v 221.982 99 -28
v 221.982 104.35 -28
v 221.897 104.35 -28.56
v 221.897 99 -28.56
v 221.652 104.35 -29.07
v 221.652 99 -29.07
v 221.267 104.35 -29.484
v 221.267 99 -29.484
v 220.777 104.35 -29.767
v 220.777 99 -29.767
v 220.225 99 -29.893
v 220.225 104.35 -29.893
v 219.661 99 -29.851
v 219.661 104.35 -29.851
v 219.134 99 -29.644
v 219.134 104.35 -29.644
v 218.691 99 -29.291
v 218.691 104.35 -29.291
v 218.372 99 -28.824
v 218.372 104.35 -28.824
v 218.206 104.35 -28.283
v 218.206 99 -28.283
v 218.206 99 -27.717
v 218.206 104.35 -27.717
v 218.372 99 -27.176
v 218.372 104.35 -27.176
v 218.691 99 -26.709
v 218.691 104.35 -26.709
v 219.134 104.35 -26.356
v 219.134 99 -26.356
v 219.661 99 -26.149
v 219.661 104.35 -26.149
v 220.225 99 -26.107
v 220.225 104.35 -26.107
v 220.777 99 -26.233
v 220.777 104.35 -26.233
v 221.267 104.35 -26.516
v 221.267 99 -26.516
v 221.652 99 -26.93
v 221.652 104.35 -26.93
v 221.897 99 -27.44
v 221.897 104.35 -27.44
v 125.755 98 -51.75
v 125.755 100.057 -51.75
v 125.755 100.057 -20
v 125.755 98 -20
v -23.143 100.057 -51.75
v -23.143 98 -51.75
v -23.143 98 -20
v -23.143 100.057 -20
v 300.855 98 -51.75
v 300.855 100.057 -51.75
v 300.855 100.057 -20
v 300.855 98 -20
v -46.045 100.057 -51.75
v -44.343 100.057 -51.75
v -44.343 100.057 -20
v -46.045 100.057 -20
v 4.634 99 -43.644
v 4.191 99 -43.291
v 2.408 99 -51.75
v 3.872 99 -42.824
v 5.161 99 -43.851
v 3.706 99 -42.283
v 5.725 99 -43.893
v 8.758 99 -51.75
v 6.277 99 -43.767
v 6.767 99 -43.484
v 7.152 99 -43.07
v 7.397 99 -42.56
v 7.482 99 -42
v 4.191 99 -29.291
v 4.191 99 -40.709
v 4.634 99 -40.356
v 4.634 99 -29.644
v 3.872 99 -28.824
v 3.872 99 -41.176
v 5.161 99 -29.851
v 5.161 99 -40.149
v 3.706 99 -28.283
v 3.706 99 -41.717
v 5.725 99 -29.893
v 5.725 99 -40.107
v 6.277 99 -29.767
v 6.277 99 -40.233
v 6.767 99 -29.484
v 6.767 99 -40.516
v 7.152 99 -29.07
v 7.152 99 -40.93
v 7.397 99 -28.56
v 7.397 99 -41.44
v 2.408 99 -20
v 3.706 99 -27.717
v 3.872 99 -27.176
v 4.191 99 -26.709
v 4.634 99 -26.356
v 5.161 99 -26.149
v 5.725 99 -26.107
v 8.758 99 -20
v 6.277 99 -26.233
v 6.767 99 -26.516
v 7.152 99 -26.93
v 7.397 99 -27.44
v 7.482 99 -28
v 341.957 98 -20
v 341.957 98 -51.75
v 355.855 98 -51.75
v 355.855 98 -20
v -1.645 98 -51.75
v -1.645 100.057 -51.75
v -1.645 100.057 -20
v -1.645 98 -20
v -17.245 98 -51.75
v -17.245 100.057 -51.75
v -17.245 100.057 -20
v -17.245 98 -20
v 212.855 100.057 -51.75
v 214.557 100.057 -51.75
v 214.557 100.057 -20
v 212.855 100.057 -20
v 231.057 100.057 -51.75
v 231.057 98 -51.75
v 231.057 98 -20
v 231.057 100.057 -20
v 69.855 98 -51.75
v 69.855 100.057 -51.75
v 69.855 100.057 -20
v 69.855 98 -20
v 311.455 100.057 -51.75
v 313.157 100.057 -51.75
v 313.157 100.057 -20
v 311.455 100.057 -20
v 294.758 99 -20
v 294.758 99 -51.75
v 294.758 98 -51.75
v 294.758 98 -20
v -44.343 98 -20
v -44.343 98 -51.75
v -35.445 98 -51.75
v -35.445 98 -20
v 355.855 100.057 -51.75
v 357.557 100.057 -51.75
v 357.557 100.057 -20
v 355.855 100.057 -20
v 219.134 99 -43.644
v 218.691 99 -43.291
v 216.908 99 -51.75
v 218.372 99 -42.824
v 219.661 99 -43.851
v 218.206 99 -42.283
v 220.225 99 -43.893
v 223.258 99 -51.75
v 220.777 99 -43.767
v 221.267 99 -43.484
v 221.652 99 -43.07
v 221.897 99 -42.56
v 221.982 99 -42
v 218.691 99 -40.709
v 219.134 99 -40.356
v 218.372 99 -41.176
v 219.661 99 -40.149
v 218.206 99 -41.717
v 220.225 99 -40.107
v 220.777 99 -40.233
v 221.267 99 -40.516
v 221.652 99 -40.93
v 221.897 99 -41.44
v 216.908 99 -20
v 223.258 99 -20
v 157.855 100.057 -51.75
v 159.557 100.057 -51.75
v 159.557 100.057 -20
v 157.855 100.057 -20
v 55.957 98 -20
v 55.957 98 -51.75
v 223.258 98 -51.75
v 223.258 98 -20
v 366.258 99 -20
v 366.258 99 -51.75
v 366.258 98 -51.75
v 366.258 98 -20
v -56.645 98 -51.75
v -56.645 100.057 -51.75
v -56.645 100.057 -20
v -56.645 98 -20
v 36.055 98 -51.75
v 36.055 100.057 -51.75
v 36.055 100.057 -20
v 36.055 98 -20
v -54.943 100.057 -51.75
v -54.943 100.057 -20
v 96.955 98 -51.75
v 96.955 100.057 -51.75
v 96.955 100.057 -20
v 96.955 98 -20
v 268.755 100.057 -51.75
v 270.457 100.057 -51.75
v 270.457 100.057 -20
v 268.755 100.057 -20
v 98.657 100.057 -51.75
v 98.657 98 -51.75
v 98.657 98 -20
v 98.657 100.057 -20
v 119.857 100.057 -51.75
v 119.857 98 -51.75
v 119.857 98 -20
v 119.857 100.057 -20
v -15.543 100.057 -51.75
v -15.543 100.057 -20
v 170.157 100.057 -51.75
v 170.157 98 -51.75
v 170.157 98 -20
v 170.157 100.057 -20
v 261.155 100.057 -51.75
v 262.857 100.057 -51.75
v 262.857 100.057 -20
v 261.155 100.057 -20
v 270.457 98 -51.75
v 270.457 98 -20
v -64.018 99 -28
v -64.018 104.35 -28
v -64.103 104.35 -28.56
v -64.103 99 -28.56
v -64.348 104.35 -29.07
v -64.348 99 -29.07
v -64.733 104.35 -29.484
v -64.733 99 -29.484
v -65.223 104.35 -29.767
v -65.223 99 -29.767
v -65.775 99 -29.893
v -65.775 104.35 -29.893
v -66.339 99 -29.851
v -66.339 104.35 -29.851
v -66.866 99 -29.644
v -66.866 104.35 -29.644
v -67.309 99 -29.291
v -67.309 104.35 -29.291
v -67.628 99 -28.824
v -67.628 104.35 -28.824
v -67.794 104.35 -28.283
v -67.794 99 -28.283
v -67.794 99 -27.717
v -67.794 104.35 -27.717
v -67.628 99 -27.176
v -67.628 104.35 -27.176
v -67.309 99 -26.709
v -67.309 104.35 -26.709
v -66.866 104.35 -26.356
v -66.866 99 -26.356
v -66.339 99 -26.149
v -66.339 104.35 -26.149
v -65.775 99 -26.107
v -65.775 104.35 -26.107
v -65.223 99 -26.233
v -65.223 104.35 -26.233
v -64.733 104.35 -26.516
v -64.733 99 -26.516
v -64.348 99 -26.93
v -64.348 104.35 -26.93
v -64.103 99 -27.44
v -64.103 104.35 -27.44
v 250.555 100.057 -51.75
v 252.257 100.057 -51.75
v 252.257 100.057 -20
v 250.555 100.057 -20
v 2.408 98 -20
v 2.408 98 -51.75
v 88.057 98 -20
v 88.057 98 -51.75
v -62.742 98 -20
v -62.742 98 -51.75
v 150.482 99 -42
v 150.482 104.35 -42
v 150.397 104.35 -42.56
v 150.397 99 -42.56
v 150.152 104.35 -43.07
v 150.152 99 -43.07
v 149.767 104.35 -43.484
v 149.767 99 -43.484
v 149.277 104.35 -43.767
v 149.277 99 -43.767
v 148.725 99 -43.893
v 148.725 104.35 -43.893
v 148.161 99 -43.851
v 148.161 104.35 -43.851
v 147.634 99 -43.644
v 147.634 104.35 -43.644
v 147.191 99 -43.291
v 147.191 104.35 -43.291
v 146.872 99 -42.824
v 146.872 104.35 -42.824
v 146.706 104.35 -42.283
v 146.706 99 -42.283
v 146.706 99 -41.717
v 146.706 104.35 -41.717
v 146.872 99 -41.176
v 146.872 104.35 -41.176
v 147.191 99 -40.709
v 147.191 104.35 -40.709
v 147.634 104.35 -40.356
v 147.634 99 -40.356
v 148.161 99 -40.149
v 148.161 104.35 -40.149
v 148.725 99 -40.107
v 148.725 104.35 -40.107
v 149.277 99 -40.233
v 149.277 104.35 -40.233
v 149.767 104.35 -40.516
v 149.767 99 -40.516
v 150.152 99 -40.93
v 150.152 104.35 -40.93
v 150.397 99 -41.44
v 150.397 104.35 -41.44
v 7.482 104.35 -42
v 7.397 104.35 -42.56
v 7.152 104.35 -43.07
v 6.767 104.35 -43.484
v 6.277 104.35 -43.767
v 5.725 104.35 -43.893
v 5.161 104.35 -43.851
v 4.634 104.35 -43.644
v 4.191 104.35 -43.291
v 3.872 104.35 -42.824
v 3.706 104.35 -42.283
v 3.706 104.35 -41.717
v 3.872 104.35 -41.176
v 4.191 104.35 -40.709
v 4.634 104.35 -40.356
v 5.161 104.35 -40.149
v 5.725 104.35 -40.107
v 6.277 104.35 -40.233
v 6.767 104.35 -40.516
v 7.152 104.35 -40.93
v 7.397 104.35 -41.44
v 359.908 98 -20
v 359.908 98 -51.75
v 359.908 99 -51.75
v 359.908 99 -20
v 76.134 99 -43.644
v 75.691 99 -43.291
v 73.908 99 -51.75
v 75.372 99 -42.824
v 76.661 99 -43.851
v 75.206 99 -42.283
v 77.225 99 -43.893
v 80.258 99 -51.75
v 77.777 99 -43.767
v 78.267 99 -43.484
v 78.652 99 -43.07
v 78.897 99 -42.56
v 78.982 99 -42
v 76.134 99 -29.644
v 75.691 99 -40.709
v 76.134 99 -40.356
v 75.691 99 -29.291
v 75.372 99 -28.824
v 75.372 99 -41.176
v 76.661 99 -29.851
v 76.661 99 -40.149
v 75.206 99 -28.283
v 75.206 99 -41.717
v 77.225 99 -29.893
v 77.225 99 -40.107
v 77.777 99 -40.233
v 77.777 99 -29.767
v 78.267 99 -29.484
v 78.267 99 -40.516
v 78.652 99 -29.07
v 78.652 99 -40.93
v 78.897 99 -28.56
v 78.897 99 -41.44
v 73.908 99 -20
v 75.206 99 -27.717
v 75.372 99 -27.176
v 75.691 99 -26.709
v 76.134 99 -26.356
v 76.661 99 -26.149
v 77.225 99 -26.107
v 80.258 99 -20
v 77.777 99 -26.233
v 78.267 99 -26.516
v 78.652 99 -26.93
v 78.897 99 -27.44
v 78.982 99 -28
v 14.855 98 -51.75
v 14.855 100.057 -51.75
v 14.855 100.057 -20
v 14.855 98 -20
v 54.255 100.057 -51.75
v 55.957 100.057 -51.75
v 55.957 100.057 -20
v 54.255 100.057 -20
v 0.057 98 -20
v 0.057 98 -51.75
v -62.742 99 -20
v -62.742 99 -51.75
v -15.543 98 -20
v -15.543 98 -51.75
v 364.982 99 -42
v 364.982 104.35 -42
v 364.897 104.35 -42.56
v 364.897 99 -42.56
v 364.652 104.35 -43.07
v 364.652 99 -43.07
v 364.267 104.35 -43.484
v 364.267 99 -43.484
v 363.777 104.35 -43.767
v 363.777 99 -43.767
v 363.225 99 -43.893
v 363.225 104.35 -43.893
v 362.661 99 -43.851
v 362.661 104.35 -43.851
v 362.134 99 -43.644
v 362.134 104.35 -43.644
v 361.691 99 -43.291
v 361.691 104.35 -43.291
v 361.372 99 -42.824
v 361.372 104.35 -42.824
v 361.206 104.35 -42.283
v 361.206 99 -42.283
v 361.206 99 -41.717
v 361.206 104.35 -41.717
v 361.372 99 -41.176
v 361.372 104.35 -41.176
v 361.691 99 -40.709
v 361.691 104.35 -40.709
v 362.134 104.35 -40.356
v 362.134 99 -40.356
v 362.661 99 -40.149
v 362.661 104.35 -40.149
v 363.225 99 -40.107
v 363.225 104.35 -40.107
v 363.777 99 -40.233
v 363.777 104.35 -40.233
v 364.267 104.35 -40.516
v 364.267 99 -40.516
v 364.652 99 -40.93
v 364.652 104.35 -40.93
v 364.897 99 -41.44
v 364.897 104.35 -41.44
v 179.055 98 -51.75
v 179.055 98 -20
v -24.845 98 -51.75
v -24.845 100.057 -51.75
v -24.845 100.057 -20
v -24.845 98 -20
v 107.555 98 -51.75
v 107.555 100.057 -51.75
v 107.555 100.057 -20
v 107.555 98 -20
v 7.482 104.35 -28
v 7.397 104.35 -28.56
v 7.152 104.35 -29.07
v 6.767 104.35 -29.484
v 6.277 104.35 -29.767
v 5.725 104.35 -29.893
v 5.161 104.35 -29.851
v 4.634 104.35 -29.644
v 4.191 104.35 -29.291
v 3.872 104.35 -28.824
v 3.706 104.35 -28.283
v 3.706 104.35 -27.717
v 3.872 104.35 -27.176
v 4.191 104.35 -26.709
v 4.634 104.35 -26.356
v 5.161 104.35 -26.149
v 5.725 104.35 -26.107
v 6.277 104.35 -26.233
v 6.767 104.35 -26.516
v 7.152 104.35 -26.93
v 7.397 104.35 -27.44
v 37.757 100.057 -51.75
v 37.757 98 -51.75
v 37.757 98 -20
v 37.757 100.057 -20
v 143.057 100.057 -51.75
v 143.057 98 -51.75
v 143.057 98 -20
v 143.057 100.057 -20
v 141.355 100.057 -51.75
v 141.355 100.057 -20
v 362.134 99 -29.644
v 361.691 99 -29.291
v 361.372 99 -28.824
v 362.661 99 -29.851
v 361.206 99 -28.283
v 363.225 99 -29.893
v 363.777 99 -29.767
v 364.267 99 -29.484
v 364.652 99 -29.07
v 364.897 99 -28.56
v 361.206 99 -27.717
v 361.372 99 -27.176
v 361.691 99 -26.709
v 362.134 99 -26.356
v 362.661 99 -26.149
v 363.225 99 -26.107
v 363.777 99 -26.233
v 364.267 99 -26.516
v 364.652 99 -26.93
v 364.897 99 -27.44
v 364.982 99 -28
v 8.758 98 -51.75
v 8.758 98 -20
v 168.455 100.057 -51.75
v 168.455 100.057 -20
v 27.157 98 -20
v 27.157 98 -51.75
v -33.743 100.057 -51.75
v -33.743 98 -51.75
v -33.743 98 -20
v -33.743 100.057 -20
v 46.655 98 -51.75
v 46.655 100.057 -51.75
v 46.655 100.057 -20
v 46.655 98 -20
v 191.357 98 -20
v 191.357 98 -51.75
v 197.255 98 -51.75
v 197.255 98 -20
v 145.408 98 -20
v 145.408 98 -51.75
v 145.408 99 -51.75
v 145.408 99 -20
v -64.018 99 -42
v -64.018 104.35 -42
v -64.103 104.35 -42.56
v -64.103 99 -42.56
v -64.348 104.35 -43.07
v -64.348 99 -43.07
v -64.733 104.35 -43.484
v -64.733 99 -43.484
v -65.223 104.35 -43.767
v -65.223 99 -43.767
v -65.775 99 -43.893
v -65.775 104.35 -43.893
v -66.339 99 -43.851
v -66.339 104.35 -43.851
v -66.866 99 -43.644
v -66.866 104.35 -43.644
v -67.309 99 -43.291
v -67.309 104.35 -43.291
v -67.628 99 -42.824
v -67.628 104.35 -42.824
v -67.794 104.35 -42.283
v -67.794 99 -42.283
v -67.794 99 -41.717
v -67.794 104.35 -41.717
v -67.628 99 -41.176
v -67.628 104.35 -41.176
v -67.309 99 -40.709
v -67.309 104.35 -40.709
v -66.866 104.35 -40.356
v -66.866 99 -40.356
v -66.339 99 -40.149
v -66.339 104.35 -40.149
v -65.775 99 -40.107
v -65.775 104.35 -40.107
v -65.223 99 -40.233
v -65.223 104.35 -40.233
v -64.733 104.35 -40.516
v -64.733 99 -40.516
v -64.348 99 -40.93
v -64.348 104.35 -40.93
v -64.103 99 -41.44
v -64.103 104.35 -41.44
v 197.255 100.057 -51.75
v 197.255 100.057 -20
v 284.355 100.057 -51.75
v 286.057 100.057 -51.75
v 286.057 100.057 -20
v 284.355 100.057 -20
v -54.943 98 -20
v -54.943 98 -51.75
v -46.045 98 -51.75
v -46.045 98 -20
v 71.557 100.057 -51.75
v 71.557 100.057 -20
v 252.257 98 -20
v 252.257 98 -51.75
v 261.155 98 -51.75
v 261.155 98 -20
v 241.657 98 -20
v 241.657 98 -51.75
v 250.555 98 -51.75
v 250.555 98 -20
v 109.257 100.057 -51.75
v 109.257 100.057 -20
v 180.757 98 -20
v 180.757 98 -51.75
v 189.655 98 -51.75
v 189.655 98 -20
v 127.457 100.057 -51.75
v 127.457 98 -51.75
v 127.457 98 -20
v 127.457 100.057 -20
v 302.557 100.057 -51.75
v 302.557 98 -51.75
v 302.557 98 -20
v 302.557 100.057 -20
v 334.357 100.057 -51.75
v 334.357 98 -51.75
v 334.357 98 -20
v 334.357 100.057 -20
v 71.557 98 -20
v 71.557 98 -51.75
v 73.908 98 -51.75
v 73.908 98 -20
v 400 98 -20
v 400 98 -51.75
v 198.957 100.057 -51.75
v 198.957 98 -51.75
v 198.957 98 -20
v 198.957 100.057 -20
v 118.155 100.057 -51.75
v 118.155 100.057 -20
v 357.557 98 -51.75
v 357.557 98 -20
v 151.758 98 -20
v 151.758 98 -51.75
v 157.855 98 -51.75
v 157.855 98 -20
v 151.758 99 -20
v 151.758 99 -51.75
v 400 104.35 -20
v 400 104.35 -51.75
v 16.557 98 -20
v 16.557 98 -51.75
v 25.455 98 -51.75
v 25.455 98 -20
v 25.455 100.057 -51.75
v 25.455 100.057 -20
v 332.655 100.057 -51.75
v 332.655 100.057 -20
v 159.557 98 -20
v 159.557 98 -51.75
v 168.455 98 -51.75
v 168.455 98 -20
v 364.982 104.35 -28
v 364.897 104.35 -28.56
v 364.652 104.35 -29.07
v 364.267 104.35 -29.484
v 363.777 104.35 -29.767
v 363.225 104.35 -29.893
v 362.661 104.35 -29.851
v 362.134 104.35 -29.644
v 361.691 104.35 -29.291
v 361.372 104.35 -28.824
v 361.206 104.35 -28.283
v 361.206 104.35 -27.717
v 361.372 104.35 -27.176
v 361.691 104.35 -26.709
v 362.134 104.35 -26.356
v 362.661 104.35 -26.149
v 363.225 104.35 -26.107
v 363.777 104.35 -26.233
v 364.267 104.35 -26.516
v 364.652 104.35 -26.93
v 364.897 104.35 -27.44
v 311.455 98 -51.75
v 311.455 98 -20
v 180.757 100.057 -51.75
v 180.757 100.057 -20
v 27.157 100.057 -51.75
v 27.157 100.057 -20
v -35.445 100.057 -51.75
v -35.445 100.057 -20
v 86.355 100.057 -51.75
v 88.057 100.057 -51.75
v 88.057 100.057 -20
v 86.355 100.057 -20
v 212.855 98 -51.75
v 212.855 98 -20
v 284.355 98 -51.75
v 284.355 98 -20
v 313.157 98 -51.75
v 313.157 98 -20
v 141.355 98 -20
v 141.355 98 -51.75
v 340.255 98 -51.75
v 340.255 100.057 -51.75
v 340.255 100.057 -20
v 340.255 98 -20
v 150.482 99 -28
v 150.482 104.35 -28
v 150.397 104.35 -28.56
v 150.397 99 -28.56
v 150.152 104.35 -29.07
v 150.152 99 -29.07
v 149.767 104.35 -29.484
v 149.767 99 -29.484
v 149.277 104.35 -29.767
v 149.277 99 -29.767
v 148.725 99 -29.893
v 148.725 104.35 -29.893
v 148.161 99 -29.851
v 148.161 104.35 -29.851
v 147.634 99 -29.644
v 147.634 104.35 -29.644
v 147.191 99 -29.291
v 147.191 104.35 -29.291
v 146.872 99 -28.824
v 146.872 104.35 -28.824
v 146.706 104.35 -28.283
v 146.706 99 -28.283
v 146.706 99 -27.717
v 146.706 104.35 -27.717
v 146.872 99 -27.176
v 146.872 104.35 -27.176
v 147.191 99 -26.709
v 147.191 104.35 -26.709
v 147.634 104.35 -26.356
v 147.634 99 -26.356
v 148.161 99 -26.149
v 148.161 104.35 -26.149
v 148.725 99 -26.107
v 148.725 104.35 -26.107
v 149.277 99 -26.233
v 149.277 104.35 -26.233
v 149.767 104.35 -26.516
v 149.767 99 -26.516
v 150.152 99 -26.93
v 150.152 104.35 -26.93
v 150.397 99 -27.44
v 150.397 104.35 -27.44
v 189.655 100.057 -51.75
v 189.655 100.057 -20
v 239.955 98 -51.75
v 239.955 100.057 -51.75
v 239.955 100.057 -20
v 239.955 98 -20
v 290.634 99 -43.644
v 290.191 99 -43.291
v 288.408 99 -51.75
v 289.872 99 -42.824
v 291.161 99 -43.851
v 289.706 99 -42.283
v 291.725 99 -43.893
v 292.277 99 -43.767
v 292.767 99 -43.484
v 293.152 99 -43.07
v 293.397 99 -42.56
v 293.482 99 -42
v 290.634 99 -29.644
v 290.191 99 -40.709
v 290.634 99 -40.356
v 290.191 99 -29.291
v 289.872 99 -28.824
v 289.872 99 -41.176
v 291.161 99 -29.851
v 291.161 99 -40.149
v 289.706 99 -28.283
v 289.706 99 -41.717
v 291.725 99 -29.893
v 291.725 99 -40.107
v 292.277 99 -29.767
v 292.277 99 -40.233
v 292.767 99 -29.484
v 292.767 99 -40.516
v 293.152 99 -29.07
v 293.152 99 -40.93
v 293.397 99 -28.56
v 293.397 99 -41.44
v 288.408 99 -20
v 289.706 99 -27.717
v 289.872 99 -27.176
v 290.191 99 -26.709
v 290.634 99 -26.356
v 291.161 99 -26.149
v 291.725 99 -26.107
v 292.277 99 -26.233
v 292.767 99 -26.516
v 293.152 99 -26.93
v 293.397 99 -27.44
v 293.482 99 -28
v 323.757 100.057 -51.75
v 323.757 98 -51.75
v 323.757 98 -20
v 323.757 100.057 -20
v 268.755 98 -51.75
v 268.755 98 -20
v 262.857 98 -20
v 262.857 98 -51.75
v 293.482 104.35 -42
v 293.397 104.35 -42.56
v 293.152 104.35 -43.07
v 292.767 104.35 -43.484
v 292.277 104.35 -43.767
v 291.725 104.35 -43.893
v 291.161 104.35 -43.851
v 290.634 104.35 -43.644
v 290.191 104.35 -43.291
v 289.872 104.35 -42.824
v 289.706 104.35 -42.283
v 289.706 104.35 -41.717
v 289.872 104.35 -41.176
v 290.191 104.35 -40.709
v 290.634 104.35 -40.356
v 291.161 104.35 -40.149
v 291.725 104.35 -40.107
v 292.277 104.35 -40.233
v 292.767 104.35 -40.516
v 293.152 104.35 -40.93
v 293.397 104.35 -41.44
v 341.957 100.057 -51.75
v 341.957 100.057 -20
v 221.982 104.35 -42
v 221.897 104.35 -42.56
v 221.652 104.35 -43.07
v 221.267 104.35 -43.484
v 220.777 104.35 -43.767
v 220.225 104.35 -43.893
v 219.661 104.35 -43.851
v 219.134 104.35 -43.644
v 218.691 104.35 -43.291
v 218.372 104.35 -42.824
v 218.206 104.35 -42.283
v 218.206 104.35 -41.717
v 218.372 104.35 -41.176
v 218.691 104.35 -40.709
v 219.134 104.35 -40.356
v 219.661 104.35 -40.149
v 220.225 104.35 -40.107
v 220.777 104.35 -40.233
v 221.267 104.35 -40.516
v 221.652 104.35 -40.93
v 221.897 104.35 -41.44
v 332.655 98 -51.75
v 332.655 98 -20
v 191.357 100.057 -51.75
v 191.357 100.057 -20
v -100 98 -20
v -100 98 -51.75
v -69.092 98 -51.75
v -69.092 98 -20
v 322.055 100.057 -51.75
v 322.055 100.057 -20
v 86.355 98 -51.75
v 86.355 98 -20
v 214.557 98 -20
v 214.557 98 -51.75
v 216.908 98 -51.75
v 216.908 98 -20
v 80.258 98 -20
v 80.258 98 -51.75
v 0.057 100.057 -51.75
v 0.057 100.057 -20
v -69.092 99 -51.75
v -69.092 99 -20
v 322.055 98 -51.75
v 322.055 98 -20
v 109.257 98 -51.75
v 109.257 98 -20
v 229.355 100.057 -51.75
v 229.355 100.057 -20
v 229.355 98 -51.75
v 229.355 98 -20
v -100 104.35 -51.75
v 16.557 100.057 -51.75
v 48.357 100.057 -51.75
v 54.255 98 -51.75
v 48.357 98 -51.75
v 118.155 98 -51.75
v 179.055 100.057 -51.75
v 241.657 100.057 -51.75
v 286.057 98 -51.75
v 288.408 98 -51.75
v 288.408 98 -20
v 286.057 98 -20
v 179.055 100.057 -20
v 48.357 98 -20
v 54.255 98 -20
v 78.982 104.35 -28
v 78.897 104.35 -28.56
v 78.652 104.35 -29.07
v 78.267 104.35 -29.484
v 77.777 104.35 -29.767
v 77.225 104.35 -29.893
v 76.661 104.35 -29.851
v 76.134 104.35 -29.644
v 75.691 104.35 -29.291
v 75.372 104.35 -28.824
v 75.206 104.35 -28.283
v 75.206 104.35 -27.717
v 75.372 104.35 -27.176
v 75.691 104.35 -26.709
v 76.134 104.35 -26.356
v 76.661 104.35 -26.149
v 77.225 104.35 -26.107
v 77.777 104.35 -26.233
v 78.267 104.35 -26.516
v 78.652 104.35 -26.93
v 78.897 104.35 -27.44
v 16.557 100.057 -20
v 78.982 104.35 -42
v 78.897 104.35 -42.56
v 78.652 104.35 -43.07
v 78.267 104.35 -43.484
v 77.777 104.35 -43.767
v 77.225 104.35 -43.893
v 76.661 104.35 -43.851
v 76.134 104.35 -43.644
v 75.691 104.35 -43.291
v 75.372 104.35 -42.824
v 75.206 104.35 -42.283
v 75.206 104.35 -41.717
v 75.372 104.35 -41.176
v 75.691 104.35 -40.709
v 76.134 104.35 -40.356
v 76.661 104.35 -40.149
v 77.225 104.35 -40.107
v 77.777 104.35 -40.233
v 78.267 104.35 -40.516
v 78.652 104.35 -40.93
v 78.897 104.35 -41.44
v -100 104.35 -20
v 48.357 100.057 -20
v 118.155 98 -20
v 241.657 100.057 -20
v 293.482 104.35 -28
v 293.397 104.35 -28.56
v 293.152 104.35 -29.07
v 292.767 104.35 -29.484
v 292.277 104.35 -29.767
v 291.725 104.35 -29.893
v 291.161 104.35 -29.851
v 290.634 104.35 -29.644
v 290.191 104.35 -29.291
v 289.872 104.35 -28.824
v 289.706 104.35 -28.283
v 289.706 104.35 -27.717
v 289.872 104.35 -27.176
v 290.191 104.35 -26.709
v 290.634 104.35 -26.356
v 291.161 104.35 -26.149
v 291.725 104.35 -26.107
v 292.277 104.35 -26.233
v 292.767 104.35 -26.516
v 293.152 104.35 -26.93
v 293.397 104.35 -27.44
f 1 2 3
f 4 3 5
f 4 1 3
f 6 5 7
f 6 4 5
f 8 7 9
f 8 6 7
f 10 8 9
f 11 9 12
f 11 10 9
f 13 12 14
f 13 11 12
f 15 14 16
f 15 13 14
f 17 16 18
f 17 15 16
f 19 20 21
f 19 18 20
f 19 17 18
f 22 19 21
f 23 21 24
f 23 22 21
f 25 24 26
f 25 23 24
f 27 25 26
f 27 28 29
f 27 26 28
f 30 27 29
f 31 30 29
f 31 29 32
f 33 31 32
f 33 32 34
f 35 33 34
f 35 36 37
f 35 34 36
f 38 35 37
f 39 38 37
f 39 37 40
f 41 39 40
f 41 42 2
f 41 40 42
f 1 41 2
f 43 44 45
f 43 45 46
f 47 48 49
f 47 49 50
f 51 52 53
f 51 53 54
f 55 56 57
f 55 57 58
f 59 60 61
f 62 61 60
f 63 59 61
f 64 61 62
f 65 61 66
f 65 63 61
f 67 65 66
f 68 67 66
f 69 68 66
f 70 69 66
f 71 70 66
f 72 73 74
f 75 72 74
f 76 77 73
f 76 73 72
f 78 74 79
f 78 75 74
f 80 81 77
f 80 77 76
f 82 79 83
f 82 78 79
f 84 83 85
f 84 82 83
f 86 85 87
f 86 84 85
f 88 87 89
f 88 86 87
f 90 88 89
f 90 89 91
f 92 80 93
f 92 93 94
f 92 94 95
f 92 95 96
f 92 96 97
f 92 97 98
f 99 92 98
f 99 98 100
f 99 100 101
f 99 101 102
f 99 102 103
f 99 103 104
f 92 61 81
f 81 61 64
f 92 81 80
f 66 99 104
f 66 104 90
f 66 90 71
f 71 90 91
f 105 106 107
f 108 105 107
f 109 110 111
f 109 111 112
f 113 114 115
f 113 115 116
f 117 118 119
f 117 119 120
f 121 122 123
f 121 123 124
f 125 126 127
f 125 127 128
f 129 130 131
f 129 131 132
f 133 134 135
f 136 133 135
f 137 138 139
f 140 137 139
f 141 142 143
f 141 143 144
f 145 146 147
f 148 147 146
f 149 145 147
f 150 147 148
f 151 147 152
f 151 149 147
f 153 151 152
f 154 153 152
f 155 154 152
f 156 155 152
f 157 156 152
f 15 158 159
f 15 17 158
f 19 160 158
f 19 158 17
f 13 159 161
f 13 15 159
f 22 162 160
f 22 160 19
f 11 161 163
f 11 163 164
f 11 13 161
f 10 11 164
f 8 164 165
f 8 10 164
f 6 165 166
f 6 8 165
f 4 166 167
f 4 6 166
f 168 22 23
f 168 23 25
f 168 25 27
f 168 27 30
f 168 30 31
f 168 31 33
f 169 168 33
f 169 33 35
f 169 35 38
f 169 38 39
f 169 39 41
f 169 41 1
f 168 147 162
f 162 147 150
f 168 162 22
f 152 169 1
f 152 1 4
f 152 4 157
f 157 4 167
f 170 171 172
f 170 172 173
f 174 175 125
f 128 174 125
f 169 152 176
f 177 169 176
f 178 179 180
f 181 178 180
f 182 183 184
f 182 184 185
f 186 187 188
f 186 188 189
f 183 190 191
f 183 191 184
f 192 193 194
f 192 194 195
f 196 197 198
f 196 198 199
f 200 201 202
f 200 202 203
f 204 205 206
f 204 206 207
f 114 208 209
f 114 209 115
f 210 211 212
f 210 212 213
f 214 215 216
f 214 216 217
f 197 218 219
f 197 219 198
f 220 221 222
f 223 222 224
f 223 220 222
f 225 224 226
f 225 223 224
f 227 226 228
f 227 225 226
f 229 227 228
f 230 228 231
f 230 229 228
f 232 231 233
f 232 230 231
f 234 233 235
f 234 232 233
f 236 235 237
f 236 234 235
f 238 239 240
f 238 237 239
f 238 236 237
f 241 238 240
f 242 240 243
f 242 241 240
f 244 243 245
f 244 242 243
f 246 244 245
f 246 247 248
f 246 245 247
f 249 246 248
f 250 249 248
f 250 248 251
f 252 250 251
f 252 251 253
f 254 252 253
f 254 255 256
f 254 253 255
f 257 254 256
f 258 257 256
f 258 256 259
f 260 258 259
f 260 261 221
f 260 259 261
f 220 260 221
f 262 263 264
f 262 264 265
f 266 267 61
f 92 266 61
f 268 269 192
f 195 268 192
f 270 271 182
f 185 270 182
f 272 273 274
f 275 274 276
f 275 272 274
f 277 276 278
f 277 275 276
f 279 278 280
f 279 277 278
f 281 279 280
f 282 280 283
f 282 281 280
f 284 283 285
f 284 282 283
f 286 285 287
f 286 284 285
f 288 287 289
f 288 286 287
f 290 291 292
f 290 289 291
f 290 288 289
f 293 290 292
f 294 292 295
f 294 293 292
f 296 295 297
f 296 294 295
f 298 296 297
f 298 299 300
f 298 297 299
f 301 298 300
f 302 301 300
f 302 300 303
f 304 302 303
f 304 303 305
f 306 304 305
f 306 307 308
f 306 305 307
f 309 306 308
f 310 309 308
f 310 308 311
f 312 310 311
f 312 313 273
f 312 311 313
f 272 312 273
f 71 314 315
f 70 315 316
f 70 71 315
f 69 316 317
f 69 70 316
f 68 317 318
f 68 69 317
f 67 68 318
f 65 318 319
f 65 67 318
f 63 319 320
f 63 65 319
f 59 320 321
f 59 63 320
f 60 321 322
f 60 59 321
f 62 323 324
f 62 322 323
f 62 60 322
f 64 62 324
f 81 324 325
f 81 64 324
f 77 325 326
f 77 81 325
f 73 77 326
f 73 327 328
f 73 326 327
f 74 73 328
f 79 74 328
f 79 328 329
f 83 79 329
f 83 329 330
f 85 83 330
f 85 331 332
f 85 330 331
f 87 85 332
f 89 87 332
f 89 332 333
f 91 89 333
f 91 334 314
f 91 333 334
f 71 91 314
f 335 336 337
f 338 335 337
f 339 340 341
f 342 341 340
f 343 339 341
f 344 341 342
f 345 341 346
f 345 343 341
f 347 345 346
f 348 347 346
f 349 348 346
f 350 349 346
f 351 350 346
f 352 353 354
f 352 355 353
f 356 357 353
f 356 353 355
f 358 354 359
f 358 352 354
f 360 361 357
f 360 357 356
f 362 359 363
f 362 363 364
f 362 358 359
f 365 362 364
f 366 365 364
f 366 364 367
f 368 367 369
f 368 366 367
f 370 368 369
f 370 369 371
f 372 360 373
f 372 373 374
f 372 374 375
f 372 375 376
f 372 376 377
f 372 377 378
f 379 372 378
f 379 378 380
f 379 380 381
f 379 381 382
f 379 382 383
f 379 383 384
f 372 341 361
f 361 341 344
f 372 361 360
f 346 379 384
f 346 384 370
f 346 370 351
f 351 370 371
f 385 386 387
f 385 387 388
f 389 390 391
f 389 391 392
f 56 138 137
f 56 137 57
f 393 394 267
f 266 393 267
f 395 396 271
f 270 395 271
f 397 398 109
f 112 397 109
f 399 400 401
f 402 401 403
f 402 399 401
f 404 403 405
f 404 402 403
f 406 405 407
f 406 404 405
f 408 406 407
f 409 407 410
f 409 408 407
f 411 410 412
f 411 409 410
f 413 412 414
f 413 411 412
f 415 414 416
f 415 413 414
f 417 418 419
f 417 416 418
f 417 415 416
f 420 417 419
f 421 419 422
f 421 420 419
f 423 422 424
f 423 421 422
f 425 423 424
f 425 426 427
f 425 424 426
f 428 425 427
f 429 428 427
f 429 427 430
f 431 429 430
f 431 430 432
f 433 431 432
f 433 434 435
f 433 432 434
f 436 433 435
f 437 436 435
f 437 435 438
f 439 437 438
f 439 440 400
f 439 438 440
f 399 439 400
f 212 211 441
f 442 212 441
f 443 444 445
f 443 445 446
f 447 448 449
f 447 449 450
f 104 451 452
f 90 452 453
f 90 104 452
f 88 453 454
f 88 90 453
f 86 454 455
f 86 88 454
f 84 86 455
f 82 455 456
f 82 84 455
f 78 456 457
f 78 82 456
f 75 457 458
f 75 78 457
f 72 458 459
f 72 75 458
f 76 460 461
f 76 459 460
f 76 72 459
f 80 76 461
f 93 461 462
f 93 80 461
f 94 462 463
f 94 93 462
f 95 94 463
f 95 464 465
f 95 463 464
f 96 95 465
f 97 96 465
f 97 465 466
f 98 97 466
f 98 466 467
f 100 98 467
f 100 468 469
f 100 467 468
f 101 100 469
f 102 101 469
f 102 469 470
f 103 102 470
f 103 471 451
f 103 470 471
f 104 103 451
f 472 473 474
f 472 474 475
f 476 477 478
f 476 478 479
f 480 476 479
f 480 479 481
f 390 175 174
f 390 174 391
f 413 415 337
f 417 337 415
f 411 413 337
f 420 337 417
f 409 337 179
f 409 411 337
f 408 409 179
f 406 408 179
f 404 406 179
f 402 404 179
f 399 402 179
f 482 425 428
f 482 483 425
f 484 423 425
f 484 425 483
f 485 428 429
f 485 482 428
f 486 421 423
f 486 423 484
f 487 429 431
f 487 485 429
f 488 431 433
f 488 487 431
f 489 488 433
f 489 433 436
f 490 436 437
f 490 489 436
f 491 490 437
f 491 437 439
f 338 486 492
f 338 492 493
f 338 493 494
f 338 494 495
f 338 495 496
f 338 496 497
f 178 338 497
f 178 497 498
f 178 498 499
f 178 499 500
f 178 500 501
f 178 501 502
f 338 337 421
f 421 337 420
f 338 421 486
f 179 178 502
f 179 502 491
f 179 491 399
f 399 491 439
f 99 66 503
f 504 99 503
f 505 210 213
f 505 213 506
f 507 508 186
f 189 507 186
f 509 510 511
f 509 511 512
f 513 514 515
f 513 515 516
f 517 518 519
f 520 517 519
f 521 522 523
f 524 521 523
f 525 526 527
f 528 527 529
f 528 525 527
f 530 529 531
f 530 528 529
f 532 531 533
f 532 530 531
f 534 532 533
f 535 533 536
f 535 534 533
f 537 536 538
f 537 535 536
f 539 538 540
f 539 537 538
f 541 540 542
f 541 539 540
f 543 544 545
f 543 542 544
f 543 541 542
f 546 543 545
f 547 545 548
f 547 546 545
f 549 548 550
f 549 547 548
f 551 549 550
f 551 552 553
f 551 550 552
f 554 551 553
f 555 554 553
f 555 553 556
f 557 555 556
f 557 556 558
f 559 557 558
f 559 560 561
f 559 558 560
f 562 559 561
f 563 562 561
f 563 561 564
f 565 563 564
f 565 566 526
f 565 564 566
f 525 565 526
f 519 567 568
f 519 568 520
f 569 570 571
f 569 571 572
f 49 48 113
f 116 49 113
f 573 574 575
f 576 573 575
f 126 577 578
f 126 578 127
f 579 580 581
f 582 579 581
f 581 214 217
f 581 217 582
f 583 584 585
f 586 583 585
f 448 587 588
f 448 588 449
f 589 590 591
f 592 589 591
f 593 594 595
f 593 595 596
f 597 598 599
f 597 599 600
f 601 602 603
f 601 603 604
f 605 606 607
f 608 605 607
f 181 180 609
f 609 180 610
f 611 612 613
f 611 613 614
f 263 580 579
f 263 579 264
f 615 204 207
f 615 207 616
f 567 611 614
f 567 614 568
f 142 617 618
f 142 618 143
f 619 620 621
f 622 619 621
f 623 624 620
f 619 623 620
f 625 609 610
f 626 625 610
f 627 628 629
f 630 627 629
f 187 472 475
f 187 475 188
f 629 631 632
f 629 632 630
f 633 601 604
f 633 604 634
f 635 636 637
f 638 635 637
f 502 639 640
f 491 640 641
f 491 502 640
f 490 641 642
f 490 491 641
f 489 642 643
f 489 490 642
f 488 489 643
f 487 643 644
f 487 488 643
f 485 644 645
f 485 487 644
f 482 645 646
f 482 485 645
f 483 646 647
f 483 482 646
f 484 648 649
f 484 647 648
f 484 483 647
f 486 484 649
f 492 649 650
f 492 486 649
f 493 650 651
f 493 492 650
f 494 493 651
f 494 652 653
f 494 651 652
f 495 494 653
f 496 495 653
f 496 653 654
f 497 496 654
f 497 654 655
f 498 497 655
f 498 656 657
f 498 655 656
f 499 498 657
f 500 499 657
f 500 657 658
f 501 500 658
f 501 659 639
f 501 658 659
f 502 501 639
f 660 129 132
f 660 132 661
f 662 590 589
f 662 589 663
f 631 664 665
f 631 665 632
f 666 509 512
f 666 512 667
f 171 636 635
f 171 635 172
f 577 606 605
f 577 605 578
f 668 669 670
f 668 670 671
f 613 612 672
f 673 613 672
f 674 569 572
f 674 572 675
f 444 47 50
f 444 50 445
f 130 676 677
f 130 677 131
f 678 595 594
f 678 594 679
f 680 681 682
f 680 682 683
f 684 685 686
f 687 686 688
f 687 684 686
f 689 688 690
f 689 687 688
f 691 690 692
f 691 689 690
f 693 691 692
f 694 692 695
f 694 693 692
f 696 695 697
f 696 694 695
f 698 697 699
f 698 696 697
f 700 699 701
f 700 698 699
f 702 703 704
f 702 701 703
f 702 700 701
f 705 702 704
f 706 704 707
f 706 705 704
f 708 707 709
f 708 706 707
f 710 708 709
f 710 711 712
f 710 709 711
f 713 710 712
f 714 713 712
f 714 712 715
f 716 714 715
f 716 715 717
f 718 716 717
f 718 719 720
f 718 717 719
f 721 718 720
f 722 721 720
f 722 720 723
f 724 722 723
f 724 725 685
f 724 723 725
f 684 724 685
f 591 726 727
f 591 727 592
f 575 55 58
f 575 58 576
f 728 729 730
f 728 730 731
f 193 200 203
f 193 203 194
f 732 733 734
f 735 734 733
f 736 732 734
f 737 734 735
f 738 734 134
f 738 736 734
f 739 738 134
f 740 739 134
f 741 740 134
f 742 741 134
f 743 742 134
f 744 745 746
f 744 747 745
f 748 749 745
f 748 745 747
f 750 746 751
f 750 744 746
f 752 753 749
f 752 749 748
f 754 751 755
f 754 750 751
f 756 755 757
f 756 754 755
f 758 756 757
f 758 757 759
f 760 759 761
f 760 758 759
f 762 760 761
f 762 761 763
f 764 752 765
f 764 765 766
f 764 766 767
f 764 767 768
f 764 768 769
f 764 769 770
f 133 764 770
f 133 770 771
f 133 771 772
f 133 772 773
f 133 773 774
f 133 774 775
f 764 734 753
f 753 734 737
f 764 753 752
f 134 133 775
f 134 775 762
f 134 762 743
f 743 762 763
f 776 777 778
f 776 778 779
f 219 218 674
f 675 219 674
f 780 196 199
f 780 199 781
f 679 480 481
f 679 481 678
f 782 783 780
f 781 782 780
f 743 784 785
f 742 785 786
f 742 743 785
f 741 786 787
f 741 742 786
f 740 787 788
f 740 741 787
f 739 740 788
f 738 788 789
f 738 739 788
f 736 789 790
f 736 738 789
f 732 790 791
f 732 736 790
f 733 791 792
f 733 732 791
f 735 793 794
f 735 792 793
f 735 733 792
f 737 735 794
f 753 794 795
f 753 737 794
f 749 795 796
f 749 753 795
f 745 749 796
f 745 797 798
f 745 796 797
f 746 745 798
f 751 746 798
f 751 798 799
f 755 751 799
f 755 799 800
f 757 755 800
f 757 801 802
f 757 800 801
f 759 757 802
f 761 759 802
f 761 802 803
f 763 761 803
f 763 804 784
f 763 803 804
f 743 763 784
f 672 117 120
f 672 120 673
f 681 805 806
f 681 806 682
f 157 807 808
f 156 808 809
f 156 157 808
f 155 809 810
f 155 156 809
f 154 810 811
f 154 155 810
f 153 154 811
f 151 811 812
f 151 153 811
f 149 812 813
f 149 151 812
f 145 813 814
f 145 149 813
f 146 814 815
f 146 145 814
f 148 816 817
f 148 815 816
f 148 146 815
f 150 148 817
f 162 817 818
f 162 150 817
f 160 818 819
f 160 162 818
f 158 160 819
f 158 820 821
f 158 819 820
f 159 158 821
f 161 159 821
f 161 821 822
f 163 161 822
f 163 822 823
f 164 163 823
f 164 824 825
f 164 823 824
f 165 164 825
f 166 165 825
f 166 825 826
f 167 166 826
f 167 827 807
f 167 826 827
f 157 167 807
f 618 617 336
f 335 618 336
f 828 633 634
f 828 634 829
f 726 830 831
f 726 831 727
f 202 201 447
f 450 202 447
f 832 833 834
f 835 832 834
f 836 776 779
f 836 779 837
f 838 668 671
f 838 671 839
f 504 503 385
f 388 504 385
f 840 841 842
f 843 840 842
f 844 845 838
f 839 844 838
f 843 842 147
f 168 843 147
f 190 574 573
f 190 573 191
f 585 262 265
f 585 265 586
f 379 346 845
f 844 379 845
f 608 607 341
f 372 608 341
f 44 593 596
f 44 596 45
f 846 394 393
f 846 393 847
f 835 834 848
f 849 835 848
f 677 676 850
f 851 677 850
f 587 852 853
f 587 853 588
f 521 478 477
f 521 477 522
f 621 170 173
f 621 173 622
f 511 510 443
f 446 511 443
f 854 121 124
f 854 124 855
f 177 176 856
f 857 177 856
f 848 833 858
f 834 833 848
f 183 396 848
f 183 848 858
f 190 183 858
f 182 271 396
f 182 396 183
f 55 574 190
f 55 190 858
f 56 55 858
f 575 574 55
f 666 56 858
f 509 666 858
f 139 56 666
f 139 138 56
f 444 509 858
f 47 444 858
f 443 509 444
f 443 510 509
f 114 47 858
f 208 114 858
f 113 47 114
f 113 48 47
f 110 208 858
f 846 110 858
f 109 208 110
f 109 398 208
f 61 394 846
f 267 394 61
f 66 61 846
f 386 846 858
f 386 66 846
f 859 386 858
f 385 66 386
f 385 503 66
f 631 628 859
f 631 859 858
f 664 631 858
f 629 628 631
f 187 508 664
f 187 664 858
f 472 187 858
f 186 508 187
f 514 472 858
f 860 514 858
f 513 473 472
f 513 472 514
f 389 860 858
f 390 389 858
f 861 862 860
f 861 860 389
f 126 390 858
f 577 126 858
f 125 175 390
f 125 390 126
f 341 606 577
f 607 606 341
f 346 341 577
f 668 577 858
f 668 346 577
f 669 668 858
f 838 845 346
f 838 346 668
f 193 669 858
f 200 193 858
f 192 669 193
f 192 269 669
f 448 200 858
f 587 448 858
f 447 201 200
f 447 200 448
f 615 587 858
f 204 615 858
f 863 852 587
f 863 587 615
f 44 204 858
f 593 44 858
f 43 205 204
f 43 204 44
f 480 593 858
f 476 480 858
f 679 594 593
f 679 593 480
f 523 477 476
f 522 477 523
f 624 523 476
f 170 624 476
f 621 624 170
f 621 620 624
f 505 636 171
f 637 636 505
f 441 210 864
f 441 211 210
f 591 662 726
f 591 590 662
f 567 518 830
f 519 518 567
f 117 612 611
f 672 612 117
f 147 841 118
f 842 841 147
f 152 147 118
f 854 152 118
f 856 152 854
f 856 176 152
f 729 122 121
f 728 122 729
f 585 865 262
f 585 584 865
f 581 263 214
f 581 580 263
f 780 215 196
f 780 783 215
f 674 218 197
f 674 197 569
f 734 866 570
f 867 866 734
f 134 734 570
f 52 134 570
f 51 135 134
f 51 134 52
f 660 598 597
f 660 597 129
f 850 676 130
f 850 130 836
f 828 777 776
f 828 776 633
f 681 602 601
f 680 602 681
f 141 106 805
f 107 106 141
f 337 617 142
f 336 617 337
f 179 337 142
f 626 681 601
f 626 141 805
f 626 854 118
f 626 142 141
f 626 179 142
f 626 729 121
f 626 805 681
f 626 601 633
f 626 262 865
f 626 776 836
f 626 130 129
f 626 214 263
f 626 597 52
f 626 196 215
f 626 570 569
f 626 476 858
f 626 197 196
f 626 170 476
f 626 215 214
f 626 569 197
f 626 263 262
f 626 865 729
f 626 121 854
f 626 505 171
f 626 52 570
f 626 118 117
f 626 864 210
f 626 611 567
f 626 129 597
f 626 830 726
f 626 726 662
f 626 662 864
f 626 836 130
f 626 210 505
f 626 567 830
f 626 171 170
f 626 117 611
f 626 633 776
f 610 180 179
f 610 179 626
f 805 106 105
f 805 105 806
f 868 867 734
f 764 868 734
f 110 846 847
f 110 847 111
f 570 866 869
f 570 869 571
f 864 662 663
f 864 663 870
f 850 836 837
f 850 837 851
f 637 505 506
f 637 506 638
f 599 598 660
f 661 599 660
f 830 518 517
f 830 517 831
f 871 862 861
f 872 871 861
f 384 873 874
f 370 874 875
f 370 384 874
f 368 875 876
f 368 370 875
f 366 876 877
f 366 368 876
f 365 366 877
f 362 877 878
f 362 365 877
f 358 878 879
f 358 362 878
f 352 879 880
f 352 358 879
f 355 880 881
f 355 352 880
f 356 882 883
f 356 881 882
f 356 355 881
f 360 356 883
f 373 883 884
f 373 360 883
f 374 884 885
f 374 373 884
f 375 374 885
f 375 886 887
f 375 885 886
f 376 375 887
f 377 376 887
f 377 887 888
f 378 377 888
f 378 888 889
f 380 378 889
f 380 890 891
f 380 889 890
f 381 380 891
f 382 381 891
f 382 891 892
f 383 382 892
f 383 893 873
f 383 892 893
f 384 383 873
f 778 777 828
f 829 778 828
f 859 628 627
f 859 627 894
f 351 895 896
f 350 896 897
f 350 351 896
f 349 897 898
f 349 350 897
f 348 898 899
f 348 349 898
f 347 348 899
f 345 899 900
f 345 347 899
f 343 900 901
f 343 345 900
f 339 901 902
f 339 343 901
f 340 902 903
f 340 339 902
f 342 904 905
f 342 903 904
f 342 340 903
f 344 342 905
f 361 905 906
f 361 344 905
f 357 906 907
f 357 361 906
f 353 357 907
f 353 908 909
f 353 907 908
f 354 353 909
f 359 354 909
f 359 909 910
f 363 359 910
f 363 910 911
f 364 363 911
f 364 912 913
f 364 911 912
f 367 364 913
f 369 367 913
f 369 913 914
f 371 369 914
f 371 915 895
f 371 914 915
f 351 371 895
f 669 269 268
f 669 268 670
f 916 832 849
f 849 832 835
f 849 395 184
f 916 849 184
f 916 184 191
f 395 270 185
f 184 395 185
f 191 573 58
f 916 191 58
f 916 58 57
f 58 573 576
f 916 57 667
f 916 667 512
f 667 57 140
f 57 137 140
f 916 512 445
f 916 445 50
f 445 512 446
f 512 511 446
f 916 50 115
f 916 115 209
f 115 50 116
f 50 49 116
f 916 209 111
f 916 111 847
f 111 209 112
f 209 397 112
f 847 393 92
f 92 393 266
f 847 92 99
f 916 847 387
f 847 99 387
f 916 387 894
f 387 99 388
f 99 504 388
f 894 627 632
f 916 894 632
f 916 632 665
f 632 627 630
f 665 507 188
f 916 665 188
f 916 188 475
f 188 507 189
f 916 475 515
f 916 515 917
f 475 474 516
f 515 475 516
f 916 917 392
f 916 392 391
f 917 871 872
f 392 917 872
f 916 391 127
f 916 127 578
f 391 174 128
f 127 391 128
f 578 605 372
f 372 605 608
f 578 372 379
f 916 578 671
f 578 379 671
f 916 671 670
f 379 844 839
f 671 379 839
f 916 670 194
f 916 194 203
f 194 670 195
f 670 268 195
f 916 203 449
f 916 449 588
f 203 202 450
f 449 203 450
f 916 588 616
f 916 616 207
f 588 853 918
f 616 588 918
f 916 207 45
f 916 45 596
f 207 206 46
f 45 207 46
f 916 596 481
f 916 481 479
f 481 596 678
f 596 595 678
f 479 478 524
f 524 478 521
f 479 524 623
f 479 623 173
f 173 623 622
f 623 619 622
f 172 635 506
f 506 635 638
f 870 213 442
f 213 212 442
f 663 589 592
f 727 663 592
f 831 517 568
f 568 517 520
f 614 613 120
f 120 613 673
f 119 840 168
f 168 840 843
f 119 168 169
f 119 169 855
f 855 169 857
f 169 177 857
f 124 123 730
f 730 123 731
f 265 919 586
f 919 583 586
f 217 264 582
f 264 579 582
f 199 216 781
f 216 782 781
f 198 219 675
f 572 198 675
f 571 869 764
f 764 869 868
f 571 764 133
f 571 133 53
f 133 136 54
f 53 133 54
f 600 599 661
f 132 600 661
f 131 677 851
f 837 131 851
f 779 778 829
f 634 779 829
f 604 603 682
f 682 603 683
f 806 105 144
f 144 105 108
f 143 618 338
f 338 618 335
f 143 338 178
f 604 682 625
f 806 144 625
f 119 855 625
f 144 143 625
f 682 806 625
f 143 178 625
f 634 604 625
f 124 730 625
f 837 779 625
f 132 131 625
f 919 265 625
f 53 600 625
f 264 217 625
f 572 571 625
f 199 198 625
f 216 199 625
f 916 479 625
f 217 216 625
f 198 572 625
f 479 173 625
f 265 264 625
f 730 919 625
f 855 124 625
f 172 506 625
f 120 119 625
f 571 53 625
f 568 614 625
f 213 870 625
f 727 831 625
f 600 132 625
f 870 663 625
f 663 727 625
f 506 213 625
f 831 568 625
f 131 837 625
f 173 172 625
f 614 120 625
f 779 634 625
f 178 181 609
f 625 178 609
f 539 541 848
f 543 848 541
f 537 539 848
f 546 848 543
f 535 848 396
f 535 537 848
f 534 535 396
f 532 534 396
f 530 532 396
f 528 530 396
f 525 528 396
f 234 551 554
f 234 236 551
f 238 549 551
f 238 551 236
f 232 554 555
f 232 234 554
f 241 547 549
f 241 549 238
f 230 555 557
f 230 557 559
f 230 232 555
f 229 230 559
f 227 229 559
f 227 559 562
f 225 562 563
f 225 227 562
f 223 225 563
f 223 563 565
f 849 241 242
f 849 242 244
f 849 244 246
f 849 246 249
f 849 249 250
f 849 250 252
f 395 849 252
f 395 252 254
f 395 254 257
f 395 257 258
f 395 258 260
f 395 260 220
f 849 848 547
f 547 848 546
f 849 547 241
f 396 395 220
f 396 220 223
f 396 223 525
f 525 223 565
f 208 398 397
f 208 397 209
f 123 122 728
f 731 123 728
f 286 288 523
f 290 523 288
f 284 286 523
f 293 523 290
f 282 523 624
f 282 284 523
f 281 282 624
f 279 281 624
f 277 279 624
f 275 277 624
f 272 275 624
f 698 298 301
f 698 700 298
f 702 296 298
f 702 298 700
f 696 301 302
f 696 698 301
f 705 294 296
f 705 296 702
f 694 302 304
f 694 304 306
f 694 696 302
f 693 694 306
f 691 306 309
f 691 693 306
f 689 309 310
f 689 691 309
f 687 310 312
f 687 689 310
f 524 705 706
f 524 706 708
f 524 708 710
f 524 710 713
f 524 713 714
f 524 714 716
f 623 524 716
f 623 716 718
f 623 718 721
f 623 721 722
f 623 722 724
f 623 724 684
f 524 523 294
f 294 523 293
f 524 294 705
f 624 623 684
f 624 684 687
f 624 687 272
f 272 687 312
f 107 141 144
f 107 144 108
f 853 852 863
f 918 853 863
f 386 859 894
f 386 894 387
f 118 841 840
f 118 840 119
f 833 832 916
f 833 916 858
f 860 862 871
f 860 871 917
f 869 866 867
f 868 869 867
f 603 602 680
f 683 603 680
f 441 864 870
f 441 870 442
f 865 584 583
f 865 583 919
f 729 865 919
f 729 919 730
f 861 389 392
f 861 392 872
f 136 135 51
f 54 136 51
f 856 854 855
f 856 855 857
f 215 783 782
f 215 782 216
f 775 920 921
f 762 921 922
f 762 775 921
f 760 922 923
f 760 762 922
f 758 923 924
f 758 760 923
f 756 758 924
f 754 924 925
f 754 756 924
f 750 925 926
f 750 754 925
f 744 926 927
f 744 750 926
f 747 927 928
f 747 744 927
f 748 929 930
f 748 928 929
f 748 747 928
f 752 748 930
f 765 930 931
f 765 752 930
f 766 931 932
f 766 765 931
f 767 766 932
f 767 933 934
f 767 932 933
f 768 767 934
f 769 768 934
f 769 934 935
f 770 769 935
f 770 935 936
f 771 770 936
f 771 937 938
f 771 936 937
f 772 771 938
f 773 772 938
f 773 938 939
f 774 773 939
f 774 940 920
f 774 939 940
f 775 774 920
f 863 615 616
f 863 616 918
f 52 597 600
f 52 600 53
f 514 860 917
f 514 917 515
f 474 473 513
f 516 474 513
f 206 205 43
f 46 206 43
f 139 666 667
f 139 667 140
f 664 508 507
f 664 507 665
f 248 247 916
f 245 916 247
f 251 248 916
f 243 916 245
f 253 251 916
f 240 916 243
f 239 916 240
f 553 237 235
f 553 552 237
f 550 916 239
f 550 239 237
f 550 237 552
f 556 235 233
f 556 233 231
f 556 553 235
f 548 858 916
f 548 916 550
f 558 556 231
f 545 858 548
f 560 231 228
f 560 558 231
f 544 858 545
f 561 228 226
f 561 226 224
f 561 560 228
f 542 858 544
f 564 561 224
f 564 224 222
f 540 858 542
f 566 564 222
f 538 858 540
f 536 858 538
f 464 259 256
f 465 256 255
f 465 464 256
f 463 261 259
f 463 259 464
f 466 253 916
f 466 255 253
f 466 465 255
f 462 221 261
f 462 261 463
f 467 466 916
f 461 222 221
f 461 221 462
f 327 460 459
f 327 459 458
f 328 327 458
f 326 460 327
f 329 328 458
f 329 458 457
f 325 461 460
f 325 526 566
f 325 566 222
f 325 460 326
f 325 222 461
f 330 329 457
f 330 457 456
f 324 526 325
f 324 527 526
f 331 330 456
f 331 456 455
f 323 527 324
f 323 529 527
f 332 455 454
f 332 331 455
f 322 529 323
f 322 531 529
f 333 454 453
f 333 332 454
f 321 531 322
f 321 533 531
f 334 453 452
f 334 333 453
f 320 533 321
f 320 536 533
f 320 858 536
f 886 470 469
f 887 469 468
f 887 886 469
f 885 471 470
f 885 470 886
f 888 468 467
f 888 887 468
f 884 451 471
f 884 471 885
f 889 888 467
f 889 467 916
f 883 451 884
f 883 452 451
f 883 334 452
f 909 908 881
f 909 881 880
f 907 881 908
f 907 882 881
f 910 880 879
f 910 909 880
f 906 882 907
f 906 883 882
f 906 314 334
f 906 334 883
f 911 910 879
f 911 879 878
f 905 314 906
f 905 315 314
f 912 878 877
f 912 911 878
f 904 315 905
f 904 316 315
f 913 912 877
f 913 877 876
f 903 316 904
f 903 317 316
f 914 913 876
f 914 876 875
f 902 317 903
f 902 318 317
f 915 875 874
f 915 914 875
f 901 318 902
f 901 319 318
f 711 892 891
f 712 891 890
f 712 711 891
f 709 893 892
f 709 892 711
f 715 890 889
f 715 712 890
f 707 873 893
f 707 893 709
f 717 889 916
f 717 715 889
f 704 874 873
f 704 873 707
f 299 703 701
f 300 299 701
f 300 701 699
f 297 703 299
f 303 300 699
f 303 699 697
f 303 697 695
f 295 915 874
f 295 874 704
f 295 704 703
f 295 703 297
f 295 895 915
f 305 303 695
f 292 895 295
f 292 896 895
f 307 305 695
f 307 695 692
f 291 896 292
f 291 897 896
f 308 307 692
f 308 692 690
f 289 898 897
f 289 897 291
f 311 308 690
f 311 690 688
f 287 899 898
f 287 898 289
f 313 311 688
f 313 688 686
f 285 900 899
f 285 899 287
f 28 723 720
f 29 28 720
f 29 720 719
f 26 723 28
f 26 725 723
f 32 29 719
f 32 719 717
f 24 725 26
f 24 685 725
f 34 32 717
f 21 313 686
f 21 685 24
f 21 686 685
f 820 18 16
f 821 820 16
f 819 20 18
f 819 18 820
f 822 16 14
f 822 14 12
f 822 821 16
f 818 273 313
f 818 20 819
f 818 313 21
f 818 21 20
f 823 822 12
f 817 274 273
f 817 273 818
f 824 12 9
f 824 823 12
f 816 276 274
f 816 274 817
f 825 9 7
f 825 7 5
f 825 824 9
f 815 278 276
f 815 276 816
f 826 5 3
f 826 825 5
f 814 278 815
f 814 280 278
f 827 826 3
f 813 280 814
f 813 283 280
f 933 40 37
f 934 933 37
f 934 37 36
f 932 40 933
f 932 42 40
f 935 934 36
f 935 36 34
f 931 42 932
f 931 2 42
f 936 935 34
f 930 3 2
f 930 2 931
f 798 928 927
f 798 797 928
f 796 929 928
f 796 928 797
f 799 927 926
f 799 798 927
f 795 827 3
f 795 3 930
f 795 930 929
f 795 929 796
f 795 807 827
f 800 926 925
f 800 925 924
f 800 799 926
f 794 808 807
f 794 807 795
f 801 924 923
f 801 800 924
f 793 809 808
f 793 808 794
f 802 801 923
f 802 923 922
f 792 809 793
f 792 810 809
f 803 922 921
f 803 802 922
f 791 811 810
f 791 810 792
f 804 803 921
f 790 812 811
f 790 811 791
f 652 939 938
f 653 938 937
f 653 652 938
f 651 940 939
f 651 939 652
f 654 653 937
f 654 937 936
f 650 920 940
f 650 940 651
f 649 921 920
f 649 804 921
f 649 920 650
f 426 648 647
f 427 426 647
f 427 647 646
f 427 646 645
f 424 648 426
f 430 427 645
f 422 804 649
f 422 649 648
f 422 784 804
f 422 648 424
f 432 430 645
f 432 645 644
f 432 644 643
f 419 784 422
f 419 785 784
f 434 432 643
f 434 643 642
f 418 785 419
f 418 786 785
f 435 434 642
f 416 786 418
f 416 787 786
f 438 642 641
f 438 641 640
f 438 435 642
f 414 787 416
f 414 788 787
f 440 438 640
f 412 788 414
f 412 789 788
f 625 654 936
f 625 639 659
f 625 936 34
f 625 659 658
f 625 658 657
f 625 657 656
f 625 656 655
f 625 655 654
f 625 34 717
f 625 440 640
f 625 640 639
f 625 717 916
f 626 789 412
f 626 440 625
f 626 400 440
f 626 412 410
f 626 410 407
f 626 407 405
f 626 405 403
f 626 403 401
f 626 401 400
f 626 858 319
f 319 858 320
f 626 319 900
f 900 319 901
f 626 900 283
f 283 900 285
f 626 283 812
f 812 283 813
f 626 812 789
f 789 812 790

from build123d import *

# Parameters (mm, degrees)
SKETCH2_W           = 500
SKETCH2_H           = 31.75
BOSS_EXTRUDE1_DEPTH = 6.35
CUT_EXTRUDE2_DEPTH  = 32.75
CUT_EXTRUDE4_DEPTH  = 32.75
SKETCH6_R           = 1.89865
CUT_EXTRUDE3_DEPTH  = 6.35


with BuildPart() as part:
    # Sketch2 → Boss-Extrude1 (new body)
    with BuildSketch(Plane(origin=(0, 98, 0), x_dir=(1, 0, 0), z_dir=(0, 1, 0))):
        with Locations((150, 35.875)):
            Rectangle(SKETCH2_W, SKETCH2_H)
    extrude(amount=BOSS_EXTRUDE1_DEPTH)

    # Sketch5 → Cut-Extrude2 (cut, through all)
    with BuildSketch(Plane(origin=(0, 0, -51.75), x_dir=(-1, 0, 0), z_dir=(0, 0, -1))):
        Polygon((-357.55715, 98), (-357.55715, 100.05715), (-355.85535, 100.05715), (-355.85535, 98), (-341.95715, 98), (-341.95715, 100.05715), (-340.25535, 100.05715), (-340.25535, 98), (-334.35715, 98), (-334.35715, 100.05715), (-332.65535, 100.05715), (-332.65535, 98), (-323.75715, 98), (-323.75715, 100.05715), (-322.05535, 100.05715), (-322.05535, 98), (-313.15715, 98), (-313.15715, 100.05715), (-311.45535, 100.05715), (-311.45535, 98), (-302.55715, 98), (-302.55715, 100.05715), (-300.85535, 100.05715), (-300.85535, 98), (-295.78949815, 98), (-295.78949815, 96.633226224), (-359.074689679, 96.633226224), (-359.074689679, 98), align=None)
        Polygon((-286.05715, 98), (-286.05715, 100.05715), (-284.35535, 100.05715), (-284.35535, 98), (-270.45715, 98), (-270.45715, 100.05715), (-268.75535, 100.05715), (-268.75535, 98), (-262.85715, 98), (-262.85715, 100.05715), (-261.15535, 100.05715), (-261.15535, 98), (-252.25715, 98), (-252.25715, 100.05715), (-250.55535, 100.05715), (-250.55535, 98), (-241.65715, 98), (-241.65715, 100.05715), (-239.95535, 100.05715), (-239.95535, 98), (-231.05715, 98), (-231.05715, 100.05715), (-229.35535, 100.05715), (-229.35535, 98), (-224.28949815, 98), (-224.28949815, 96.633226224), (-287.574689679, 96.633226224), (-287.574689679, 98), align=None)
        Polygon((-214.55715, 98), (-214.55715, 100.05715), (-212.85535, 100.05715), (-212.85535, 98), (-198.95715, 98), (-198.95715, 100.05715), (-197.25535, 100.05715), (-197.25535, 98), (-191.35715, 98), (-191.35715, 100.05715), (-189.65535, 100.05715), (-189.65535, 98), (-180.75715, 98), (-180.75715, 100.05715), (-179.05535, 100.05715), (-179.05535, 98), (-170.15715, 98), (-170.15715, 100.05715), (-168.45535, 100.05715), (-168.45535, 98), (-159.55715, 98), (-159.55715, 100.05715), (-157.85535, 100.05715), (-157.85535, 98), (-152.78949815, 98), (-152.78949815, 96.633226224), (-216.074689679, 96.633226224), (-216.074689679, 98), align=None)
        Polygon((-143.05715, 98), (-143.05715, 100.05715), (-141.35535, 100.05715), (-141.35535, 98), (-127.45715, 98), (-127.45715, 100.05715), (-125.75535, 100.05715), (-125.75535, 98), (-119.85715, 98), (-119.85715, 100.05715), (-118.15535, 100.05715), (-118.15535, 98), (-109.25715, 98), (-109.25715, 100.05715), (-107.55535, 100.05715), (-107.55535, 98), (-98.65715, 98), (-98.65715, 100.05715), (-96.95535, 100.05715), (-96.95535, 98), (-88.05715, 98), (-88.05715, 100.05715), (-86.35535, 100.05715), (-86.35535, 98), (-81.28949815, 98), (-81.28949815, 96.633226224), (-144.574689679, 96.633226224), (-144.574689679, 98), align=None)
        Polygon((-71.55715, 98), (-71.55715, 100.05715), (-69.85535, 100.05715), (-69.85535, 98), (-55.95715, 98), (-55.95715, 100.05715), (-54.25535, 100.05715), (-54.25535, 98), (-48.35715, 98), (-48.35715, 100.05715), (-46.65535, 100.05715), (-46.65535, 98), (-37.75715, 98), (-37.75715, 100.05715), (-36.05535, 100.05715), (-36.05535, 98), (-27.15715, 98), (-27.15715, 100.05715), (-25.45535, 100.05715), (-25.45535, 98), (-16.55715, 98), (-16.55715, 100.05715), (-14.85535, 100.05715), (-14.85535, 98), (-9.78949815, 98), (-9.78949815, 96.633226224), (-73.074689679, 96.633226224), (-73.074689679, 98), align=None)
        Polygon((-0.05715, 98), (-0.05715, 100.05715), (1.64465, 100.05715), (1.64465, 98), (15.54285, 98), (15.54285, 100.05715), (17.24465, 100.05715), (17.24465, 98), (23.14285, 98), (23.14285, 100.05715), (24.84465, 100.05715), (24.84465, 98), (33.74285, 98), (33.74285, 100.05715), (35.44465, 100.05715), (35.44465, 98), (44.34285, 98), (44.34285, 100.05715), (46.04465, 100.05715), (46.04465, 98), (54.94285, 98), (54.94285, 100.05715), (56.64465, 100.05715), (56.64465, 98), (61.71050185, 98), (61.71050185, 96.633226224), (-1.574689679, 96.633226224), (-1.574689679, 98), align=None)
    extrude(amount=-CUT_EXTRUDE2_DEPTH, mode=Mode.SUBTRACT)

    # Sketch7 → Cut-Extrude4 (cut, through all)
    with BuildSketch(Plane.XY.offset(-20)):
        Polygon((-70.246654546, 98), (-69.091918949, 98), (-69.091918949, 99), (-62.741918949, 99), (-62.741918949, 98), (-61.77474032, 98), (-61.77474032, 96.833570425), (-70.246654546, 96.833570425), align=None)
        Polygon((1.253345454, 98), (2.408081051, 98), (2.408081051, 99), (8.758081051, 99), (8.758081051, 98), (9.72525968, 98), (9.72525968, 96.833570425), (1.253345454, 96.833570425), align=None)
        Polygon((72.753345454, 98), (73.908081051, 98), (73.908081051, 99), (80.258081051, 99), (80.258081051, 98), (81.22525968, 98), (81.22525968, 96.833570425), (72.753345454, 96.833570425), align=None)
        Polygon((144.253345454, 98), (145.408081051, 98), (145.408081051, 99), (151.758081051, 99), (151.758081051, 98), (152.72525968, 98), (152.72525968, 96.833570425), (144.253345454, 96.833570425), align=None)
        Polygon((215.753345454, 98), (216.908081051, 98), (216.908081051, 99), (223.258081051, 99), (223.258081051, 98), (224.22525968, 98), (224.22525968, 96.833570425), (215.753345454, 96.833570425), align=None)
        Polygon((287.253345454, 98), (288.408081051, 98), (288.408081051, 99), (294.758081051, 99), (294.758081051, 98), (295.72525968, 98), (295.72525968, 96.833570425), (287.253345454, 96.833570425), align=None)
        Polygon((358.753345454, 98), (359.908081051, 98), (359.908081051, 99), (366.258081051, 99), (366.258081051, 98), (367.22525968, 98), (367.22525968, 96.833570425), (358.753345454, 96.833570425), align=None)
    extrude(amount=-CUT_EXTRUDE4_DEPTH, mode=Mode.SUBTRACT)

    # Sketch6 → Cut-Extrude3 (cut, through all)
    with BuildSketch(Plane(origin=(0, 99, 0), x_dir=(1, 0, 0), z_dir=(0, 1, 0))):
        with Locations((-65.916918949, 28)):
            Circle(SKETCH6_R)
        with Locations((-65.916918949, 42)):
            Circle(SKETCH6_R)
        with Locations((5.583081051, 28)):
            Circle(SKETCH6_R)
        with Locations((5.583081051, 42)):
            Circle(SKETCH6_R)
        with Locations((77.083081051, 28)):
            Circle(SKETCH6_R)
        with Locations((77.083081051, 42)):
            Circle(SKETCH6_R)
        with Locations((148.583081051, 28)):
            Circle(SKETCH6_R)
        with Locations((148.583081051, 42)):
            Circle(SKETCH6_R)
        with Locations((220.083081051, 28)):
            Circle(SKETCH6_R)
        with Locations((220.083081051, 42)):
            Circle(SKETCH6_R)
        with Locations((291.583081051, 28)):
            Circle(SKETCH6_R)
        with Locations((291.583081051, 42)):
            Circle(SKETCH6_R)
        with Locations((363.083081051, 28)):
            Circle(SKETCH6_R)
        with Locations((363.083081051, 42)):
            Circle(SKETCH6_R)
    extrude(amount=CUT_EXTRUDE3_DEPTH, mode=Mode.SUBTRACT)


solid = part.part
